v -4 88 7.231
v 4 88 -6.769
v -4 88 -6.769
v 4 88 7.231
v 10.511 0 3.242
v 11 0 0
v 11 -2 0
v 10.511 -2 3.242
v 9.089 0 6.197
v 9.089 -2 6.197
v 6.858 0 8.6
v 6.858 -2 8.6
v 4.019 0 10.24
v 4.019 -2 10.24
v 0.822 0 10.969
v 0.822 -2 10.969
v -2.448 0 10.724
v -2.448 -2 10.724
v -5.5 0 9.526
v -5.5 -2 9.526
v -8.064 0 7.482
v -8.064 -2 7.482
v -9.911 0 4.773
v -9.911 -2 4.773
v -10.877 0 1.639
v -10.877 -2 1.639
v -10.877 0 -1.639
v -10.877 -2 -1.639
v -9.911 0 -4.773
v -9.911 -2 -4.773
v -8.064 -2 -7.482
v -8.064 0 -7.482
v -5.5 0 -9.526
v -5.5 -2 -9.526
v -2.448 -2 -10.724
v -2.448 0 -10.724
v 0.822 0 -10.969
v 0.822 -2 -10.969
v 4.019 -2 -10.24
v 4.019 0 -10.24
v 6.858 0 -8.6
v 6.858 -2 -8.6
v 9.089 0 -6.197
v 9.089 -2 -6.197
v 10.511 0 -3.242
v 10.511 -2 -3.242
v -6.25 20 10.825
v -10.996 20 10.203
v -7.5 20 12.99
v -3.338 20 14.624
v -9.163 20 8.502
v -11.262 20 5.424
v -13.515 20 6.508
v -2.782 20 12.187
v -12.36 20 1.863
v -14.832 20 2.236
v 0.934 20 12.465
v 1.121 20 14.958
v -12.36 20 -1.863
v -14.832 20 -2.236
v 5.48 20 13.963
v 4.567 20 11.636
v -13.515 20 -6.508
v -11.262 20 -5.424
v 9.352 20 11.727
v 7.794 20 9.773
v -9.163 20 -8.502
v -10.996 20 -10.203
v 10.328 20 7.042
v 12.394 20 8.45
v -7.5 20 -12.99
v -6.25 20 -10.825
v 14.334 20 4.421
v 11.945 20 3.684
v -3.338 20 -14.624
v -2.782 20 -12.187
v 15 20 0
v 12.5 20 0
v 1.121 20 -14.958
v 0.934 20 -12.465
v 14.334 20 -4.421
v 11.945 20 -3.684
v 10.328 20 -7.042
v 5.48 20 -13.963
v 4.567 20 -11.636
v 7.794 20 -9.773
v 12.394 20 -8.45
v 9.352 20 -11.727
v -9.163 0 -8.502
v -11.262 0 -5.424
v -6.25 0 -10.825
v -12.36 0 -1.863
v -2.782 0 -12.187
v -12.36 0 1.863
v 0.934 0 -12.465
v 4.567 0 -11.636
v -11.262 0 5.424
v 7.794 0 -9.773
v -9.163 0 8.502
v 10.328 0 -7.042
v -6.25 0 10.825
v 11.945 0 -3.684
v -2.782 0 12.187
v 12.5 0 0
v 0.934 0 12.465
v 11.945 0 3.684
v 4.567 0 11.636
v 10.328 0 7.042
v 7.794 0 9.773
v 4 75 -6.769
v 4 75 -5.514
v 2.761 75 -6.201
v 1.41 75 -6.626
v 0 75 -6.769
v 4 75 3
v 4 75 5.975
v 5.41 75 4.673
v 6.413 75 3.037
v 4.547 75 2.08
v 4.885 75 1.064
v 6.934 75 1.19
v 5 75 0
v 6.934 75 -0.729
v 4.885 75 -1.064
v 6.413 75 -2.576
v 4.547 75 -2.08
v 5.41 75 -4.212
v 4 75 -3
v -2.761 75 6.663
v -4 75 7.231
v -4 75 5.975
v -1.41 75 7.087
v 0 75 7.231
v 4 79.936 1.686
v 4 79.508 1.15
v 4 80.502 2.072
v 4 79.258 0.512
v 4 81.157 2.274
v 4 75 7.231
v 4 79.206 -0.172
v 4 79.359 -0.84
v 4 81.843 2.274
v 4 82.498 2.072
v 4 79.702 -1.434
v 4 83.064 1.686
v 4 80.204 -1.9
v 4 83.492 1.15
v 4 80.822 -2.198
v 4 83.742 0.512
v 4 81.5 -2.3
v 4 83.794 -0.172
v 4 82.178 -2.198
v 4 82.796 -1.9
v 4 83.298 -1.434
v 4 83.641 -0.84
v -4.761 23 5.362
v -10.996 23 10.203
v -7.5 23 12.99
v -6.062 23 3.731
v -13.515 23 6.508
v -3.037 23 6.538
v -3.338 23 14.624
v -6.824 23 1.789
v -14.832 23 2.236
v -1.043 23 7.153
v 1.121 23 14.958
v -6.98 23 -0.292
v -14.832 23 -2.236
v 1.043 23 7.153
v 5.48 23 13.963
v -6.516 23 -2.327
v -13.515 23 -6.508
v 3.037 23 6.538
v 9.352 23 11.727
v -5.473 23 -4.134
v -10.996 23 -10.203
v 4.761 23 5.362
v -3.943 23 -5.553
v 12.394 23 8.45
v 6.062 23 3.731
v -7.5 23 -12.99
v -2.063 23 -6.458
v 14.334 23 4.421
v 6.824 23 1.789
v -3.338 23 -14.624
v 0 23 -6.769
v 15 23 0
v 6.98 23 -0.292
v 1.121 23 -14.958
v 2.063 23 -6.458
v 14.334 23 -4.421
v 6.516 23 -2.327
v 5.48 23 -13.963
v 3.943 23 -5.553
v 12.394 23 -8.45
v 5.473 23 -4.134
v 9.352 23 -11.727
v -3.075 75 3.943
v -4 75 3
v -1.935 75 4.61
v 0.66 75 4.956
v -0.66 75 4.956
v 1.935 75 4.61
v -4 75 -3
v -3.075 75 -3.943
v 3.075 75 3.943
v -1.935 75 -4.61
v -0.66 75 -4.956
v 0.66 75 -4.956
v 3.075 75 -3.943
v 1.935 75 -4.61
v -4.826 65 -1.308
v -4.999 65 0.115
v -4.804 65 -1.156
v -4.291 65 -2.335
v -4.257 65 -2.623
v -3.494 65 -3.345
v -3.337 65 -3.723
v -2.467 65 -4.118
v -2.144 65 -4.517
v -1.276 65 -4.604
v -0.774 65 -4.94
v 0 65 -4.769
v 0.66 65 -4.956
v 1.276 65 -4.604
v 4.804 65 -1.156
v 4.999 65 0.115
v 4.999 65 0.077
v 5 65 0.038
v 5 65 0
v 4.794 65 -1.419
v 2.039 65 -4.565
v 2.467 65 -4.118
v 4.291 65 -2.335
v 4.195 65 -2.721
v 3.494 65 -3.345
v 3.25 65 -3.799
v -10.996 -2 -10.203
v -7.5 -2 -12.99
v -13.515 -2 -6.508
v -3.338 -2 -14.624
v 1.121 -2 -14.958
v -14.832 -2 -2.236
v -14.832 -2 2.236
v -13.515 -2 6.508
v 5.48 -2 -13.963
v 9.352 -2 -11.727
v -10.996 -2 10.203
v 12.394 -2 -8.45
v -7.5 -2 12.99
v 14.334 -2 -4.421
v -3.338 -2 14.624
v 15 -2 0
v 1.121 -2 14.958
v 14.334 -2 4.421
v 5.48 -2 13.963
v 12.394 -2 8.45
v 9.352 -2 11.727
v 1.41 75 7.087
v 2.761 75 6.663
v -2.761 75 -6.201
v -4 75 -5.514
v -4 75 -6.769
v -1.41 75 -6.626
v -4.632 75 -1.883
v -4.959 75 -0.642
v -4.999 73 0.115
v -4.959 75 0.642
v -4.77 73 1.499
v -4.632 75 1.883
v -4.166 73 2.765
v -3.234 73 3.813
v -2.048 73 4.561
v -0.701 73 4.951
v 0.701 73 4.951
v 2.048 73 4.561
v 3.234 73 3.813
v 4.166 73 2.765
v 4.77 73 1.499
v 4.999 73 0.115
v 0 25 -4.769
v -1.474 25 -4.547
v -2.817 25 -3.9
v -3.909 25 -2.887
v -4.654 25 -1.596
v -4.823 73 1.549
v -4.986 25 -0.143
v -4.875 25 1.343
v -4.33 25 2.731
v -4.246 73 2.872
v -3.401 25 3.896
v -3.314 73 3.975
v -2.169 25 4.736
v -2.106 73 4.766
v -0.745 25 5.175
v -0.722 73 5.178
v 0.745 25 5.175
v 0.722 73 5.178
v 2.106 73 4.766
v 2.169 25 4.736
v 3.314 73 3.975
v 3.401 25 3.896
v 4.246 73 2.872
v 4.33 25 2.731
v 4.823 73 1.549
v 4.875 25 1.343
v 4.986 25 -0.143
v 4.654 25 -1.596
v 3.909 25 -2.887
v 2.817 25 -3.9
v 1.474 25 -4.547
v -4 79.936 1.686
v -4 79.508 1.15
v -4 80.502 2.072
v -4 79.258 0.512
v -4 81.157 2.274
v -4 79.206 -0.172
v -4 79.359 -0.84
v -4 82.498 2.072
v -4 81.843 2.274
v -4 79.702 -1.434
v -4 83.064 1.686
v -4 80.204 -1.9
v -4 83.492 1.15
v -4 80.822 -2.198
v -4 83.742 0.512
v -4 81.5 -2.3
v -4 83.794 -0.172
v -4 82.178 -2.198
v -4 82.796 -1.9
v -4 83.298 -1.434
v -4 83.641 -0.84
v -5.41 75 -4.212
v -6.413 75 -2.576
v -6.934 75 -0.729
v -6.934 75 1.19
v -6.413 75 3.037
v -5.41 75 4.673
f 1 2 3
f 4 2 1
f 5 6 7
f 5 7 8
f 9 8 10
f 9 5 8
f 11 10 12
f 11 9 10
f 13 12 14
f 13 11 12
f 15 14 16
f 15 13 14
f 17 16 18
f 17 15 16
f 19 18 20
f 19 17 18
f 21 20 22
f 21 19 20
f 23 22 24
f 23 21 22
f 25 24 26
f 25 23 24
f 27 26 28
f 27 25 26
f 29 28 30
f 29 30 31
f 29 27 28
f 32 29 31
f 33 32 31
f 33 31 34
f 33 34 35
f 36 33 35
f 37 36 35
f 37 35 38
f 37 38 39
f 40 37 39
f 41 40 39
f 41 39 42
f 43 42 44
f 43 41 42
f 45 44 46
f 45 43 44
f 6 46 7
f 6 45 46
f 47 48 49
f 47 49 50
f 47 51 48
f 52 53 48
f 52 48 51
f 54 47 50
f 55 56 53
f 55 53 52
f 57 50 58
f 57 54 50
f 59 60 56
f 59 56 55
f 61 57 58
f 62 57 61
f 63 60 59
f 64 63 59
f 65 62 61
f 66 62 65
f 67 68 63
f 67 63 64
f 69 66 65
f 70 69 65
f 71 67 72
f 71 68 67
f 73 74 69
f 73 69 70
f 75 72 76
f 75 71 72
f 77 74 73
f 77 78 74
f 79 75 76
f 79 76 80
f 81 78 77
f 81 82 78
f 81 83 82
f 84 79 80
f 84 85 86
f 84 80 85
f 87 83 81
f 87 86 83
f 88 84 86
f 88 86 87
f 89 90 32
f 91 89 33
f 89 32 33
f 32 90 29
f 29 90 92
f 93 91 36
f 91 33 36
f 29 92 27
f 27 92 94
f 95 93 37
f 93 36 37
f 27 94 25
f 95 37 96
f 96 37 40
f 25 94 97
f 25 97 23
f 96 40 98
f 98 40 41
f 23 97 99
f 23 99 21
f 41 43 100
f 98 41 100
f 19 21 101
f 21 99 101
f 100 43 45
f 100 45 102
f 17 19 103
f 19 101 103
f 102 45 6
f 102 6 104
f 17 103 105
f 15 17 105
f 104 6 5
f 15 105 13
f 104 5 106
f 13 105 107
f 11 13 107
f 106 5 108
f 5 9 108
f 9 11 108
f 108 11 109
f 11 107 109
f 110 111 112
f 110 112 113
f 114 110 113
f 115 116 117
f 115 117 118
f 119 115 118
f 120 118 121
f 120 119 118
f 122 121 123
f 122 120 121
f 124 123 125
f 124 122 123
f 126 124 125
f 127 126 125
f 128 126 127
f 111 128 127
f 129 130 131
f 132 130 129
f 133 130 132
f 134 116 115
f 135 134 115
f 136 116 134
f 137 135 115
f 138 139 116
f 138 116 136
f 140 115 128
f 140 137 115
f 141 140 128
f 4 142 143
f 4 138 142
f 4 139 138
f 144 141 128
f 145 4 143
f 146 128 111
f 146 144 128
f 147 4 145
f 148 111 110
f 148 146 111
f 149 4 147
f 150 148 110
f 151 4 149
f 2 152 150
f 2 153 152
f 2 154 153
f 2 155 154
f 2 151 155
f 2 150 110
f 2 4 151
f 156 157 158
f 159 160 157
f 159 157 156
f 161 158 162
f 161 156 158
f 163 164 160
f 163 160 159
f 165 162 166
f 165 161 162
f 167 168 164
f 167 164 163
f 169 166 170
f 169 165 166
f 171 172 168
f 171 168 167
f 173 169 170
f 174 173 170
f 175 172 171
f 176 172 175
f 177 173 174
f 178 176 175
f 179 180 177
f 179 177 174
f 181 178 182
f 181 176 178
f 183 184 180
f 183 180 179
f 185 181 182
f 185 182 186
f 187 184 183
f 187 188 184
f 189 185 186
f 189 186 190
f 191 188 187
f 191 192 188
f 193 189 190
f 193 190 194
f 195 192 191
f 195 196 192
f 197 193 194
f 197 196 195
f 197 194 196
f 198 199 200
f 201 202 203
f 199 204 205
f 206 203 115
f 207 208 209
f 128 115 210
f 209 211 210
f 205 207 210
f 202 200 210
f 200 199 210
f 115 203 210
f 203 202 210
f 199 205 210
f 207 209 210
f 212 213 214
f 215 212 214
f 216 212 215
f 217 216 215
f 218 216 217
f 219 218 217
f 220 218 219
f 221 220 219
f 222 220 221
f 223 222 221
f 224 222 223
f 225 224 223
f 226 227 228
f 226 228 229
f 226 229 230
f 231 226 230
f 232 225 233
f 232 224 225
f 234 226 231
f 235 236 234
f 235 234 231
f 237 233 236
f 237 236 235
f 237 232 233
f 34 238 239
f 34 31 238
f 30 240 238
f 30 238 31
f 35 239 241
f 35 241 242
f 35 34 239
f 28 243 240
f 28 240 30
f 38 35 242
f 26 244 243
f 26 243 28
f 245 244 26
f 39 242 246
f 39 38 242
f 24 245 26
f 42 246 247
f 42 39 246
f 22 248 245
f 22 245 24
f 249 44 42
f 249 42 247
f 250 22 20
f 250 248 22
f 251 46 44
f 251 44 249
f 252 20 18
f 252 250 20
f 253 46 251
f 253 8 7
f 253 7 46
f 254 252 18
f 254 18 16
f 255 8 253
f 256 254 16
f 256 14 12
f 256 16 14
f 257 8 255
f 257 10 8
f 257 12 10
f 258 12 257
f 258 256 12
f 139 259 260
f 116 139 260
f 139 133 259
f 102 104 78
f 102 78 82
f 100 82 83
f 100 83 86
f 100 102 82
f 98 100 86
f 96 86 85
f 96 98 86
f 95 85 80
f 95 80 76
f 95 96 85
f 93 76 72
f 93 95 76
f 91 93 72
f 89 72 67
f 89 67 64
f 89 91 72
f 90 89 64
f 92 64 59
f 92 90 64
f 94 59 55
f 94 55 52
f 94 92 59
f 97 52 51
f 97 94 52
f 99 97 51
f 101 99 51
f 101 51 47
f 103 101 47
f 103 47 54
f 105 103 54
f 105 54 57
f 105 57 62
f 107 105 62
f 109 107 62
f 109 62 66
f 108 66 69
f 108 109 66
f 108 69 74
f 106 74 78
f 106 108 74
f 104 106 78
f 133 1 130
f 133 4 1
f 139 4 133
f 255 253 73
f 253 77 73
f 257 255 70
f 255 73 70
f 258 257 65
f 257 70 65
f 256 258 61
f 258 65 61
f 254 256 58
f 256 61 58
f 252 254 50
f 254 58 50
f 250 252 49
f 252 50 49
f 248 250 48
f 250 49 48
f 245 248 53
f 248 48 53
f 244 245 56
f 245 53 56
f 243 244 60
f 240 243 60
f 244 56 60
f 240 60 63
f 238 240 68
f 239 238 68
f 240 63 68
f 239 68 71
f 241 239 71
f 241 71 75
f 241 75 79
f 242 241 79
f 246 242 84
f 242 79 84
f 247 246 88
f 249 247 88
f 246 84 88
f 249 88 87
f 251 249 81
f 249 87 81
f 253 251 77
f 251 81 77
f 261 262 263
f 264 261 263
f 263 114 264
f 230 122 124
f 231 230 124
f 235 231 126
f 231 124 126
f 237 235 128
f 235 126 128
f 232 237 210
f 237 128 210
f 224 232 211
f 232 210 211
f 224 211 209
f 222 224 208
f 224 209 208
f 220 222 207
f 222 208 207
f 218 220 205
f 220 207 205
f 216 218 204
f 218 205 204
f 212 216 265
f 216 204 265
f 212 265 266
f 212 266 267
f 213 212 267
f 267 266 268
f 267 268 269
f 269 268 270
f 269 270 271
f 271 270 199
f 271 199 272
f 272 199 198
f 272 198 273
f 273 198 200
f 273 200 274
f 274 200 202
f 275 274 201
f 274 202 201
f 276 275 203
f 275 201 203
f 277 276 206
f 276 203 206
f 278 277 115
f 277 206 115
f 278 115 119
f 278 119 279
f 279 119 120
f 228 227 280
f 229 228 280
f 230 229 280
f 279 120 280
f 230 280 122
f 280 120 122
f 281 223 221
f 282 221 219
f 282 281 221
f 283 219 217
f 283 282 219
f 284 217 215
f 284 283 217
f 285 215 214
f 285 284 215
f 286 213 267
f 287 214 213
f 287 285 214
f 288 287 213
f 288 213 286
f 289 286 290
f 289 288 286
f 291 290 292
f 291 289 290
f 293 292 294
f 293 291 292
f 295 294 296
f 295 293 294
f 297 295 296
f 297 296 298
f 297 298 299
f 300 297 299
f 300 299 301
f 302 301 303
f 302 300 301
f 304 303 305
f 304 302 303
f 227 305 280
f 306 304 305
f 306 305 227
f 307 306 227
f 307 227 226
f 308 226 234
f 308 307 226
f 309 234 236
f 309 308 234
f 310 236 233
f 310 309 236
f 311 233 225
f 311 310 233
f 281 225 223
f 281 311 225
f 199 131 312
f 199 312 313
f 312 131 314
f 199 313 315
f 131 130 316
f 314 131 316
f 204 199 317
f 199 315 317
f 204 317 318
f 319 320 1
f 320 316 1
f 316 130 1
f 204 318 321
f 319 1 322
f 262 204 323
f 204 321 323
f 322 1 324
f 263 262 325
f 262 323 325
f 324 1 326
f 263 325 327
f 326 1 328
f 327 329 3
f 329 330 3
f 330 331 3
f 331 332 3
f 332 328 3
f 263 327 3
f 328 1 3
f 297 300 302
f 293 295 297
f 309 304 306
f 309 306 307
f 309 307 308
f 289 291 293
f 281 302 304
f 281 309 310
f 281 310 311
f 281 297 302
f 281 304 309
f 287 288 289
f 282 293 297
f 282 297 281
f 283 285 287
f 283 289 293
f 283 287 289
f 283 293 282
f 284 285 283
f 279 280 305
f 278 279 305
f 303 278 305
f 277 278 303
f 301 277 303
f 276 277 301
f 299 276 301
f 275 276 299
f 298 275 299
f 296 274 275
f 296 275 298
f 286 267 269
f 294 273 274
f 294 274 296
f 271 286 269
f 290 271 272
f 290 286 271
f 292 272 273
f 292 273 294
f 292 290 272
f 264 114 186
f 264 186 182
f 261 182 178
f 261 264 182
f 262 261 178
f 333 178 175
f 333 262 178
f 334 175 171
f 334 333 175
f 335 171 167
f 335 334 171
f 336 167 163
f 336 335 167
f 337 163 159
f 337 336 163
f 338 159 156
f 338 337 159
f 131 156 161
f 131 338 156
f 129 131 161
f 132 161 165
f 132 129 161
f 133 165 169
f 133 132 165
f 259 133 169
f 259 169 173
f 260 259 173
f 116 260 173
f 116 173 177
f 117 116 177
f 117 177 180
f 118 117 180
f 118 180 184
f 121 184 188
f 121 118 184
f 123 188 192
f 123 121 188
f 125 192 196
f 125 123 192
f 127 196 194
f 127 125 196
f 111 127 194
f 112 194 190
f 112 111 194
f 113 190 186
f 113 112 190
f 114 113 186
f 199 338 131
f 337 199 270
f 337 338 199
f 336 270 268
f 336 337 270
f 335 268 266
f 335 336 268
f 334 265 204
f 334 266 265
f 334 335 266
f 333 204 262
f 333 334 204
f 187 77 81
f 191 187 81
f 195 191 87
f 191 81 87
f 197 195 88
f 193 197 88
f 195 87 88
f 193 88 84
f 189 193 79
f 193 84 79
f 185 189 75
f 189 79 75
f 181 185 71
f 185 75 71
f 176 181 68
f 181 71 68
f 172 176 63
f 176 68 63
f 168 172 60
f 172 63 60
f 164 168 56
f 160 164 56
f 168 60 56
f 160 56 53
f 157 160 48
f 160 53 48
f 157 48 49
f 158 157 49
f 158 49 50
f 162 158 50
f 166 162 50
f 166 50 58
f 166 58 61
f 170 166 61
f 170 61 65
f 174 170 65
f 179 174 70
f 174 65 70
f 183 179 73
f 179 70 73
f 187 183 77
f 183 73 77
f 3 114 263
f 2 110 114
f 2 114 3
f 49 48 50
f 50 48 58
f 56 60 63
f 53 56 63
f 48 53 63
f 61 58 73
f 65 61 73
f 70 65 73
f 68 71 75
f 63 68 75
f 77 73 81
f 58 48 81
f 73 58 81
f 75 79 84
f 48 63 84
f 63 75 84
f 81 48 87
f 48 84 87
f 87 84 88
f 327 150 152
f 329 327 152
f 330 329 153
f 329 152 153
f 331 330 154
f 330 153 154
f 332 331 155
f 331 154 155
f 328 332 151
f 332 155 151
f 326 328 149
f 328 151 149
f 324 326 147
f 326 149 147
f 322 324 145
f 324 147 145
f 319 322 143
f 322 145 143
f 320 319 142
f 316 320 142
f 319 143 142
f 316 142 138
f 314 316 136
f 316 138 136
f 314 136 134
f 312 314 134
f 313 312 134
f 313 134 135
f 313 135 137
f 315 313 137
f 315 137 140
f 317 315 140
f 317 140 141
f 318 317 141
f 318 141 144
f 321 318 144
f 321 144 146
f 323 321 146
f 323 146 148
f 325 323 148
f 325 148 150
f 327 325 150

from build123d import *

# Parameters (mm, degrees)
SKETCH1_R           = 15
SKETCH1_R_2         = 12.5
BOSS_EXTRUDE1_DEPTH = 20
BOSS_EXTRUDE2_START = 2
SKETCH2_R           = 15
SKETCH2_R_2         = 11
BOSS_EXTRUDE2_DEPTH = 2
SKETCH4_R           = 15
BOSS_EXTRUDE3_DEPTH = 3
BOSS_EXTRUDE4_DEPTH = 4
SKETCH7_R           = 2.3
CUT_EXTRUDE1_DEPTH  = 10
SKETCH8_R           = 5
CUT_EXTRUDE2_DEPTH  = 10


with BuildPart() as part:
    # Sketch1 → Boss-Extrude1 (new body)
    with BuildSketch(Plane(origin=(0, 0, 0), x_dir=(1, 0, 0), z_dir=(0, 1, 0))):
        Circle(SKETCH1_R)
        Circle(SKETCH1_R_2, mode=Mode.SUBTRACT)
    extrude(amount=BOSS_EXTRUDE1_DEPTH)

    # Sketch2 → Boss-Extrude2 (add)
    with BuildSketch(Plane.XZ.offset(BOSS_EXTRUDE2_START)):
        Circle(SKETCH2_R)
        Circle(SKETCH2_R_2, mode=Mode.SUBTRACT)
    extrude(amount=-BOSS_EXTRUDE2_DEPTH)


with BuildPart() as body_2:
    # Sketch4 → Boss-Extrude3 (new body)
    with BuildSketch(Plane(origin=(0, 20, 0), x_dir=(1, 0, 0), z_dir=(0, 1, 0))):
        Circle(SKETCH4_R)
    extrude(amount=BOSS_EXTRUDE3_DEPTH)

    # Sketch5 → Revolve1 (revolve)
    with BuildSketch(Plane(origin=(0, 0, 0), x_dir=(0, 0, -1), z_dir=(1, 0, 0))):
        Polygon((6.769131535, 75), (-0.230868465, 75), (-0.230868465, 73), (4.769131535, 73), (4.769131535, 25), (-0.230868465, 25), (-0.230868465, 23), (6.769131535, 23), align=None)
    revolve(axis=Axis((0, 73, 0.230868465), (0, 1, 0)))

    # Sketch5<6> → Boss-Extrude4 (add, symmetric)
    with BuildSketch(Plane(origin=(0, 0, 0), x_dir=(0, 0, -1), z_dir=(1, 0, 0))):
        Polygon((-7.230868465, 88), (-7.230868465, 75), (-0.230868465, 75), (6.769131535, 75), (6.769131535, 88), align=None)
    extrude(amount=BOSS_EXTRUDE4_DEPTH, both=True)

    # Sketch7 → Cut-Extrude1 (cut)
    with BuildSketch(Plane(origin=(4, 0, 0), x_dir=(0, 0, -1), z_dir=(1, 0, 0))):
        with Locations((0, 81.5)):
            Circle(SKETCH7_R)
    extrude(amount=-CUT_EXTRUDE1_DEPTH, mode=Mode.SUBTRACT)

    # Sketch8 → Cut-Extrude2 (cut)
    with BuildSketch(Plane(origin=(0, 75, 0), x_dir=(1, 0, 0), z_dir=(0, 1, 0))):
        Circle(SKETCH8_R)
    extrude(amount=-CUT_EXTRUDE2_DEPTH, mode=Mode.SUBTRACT)


solid = Compound([part.part, body_2.part])
